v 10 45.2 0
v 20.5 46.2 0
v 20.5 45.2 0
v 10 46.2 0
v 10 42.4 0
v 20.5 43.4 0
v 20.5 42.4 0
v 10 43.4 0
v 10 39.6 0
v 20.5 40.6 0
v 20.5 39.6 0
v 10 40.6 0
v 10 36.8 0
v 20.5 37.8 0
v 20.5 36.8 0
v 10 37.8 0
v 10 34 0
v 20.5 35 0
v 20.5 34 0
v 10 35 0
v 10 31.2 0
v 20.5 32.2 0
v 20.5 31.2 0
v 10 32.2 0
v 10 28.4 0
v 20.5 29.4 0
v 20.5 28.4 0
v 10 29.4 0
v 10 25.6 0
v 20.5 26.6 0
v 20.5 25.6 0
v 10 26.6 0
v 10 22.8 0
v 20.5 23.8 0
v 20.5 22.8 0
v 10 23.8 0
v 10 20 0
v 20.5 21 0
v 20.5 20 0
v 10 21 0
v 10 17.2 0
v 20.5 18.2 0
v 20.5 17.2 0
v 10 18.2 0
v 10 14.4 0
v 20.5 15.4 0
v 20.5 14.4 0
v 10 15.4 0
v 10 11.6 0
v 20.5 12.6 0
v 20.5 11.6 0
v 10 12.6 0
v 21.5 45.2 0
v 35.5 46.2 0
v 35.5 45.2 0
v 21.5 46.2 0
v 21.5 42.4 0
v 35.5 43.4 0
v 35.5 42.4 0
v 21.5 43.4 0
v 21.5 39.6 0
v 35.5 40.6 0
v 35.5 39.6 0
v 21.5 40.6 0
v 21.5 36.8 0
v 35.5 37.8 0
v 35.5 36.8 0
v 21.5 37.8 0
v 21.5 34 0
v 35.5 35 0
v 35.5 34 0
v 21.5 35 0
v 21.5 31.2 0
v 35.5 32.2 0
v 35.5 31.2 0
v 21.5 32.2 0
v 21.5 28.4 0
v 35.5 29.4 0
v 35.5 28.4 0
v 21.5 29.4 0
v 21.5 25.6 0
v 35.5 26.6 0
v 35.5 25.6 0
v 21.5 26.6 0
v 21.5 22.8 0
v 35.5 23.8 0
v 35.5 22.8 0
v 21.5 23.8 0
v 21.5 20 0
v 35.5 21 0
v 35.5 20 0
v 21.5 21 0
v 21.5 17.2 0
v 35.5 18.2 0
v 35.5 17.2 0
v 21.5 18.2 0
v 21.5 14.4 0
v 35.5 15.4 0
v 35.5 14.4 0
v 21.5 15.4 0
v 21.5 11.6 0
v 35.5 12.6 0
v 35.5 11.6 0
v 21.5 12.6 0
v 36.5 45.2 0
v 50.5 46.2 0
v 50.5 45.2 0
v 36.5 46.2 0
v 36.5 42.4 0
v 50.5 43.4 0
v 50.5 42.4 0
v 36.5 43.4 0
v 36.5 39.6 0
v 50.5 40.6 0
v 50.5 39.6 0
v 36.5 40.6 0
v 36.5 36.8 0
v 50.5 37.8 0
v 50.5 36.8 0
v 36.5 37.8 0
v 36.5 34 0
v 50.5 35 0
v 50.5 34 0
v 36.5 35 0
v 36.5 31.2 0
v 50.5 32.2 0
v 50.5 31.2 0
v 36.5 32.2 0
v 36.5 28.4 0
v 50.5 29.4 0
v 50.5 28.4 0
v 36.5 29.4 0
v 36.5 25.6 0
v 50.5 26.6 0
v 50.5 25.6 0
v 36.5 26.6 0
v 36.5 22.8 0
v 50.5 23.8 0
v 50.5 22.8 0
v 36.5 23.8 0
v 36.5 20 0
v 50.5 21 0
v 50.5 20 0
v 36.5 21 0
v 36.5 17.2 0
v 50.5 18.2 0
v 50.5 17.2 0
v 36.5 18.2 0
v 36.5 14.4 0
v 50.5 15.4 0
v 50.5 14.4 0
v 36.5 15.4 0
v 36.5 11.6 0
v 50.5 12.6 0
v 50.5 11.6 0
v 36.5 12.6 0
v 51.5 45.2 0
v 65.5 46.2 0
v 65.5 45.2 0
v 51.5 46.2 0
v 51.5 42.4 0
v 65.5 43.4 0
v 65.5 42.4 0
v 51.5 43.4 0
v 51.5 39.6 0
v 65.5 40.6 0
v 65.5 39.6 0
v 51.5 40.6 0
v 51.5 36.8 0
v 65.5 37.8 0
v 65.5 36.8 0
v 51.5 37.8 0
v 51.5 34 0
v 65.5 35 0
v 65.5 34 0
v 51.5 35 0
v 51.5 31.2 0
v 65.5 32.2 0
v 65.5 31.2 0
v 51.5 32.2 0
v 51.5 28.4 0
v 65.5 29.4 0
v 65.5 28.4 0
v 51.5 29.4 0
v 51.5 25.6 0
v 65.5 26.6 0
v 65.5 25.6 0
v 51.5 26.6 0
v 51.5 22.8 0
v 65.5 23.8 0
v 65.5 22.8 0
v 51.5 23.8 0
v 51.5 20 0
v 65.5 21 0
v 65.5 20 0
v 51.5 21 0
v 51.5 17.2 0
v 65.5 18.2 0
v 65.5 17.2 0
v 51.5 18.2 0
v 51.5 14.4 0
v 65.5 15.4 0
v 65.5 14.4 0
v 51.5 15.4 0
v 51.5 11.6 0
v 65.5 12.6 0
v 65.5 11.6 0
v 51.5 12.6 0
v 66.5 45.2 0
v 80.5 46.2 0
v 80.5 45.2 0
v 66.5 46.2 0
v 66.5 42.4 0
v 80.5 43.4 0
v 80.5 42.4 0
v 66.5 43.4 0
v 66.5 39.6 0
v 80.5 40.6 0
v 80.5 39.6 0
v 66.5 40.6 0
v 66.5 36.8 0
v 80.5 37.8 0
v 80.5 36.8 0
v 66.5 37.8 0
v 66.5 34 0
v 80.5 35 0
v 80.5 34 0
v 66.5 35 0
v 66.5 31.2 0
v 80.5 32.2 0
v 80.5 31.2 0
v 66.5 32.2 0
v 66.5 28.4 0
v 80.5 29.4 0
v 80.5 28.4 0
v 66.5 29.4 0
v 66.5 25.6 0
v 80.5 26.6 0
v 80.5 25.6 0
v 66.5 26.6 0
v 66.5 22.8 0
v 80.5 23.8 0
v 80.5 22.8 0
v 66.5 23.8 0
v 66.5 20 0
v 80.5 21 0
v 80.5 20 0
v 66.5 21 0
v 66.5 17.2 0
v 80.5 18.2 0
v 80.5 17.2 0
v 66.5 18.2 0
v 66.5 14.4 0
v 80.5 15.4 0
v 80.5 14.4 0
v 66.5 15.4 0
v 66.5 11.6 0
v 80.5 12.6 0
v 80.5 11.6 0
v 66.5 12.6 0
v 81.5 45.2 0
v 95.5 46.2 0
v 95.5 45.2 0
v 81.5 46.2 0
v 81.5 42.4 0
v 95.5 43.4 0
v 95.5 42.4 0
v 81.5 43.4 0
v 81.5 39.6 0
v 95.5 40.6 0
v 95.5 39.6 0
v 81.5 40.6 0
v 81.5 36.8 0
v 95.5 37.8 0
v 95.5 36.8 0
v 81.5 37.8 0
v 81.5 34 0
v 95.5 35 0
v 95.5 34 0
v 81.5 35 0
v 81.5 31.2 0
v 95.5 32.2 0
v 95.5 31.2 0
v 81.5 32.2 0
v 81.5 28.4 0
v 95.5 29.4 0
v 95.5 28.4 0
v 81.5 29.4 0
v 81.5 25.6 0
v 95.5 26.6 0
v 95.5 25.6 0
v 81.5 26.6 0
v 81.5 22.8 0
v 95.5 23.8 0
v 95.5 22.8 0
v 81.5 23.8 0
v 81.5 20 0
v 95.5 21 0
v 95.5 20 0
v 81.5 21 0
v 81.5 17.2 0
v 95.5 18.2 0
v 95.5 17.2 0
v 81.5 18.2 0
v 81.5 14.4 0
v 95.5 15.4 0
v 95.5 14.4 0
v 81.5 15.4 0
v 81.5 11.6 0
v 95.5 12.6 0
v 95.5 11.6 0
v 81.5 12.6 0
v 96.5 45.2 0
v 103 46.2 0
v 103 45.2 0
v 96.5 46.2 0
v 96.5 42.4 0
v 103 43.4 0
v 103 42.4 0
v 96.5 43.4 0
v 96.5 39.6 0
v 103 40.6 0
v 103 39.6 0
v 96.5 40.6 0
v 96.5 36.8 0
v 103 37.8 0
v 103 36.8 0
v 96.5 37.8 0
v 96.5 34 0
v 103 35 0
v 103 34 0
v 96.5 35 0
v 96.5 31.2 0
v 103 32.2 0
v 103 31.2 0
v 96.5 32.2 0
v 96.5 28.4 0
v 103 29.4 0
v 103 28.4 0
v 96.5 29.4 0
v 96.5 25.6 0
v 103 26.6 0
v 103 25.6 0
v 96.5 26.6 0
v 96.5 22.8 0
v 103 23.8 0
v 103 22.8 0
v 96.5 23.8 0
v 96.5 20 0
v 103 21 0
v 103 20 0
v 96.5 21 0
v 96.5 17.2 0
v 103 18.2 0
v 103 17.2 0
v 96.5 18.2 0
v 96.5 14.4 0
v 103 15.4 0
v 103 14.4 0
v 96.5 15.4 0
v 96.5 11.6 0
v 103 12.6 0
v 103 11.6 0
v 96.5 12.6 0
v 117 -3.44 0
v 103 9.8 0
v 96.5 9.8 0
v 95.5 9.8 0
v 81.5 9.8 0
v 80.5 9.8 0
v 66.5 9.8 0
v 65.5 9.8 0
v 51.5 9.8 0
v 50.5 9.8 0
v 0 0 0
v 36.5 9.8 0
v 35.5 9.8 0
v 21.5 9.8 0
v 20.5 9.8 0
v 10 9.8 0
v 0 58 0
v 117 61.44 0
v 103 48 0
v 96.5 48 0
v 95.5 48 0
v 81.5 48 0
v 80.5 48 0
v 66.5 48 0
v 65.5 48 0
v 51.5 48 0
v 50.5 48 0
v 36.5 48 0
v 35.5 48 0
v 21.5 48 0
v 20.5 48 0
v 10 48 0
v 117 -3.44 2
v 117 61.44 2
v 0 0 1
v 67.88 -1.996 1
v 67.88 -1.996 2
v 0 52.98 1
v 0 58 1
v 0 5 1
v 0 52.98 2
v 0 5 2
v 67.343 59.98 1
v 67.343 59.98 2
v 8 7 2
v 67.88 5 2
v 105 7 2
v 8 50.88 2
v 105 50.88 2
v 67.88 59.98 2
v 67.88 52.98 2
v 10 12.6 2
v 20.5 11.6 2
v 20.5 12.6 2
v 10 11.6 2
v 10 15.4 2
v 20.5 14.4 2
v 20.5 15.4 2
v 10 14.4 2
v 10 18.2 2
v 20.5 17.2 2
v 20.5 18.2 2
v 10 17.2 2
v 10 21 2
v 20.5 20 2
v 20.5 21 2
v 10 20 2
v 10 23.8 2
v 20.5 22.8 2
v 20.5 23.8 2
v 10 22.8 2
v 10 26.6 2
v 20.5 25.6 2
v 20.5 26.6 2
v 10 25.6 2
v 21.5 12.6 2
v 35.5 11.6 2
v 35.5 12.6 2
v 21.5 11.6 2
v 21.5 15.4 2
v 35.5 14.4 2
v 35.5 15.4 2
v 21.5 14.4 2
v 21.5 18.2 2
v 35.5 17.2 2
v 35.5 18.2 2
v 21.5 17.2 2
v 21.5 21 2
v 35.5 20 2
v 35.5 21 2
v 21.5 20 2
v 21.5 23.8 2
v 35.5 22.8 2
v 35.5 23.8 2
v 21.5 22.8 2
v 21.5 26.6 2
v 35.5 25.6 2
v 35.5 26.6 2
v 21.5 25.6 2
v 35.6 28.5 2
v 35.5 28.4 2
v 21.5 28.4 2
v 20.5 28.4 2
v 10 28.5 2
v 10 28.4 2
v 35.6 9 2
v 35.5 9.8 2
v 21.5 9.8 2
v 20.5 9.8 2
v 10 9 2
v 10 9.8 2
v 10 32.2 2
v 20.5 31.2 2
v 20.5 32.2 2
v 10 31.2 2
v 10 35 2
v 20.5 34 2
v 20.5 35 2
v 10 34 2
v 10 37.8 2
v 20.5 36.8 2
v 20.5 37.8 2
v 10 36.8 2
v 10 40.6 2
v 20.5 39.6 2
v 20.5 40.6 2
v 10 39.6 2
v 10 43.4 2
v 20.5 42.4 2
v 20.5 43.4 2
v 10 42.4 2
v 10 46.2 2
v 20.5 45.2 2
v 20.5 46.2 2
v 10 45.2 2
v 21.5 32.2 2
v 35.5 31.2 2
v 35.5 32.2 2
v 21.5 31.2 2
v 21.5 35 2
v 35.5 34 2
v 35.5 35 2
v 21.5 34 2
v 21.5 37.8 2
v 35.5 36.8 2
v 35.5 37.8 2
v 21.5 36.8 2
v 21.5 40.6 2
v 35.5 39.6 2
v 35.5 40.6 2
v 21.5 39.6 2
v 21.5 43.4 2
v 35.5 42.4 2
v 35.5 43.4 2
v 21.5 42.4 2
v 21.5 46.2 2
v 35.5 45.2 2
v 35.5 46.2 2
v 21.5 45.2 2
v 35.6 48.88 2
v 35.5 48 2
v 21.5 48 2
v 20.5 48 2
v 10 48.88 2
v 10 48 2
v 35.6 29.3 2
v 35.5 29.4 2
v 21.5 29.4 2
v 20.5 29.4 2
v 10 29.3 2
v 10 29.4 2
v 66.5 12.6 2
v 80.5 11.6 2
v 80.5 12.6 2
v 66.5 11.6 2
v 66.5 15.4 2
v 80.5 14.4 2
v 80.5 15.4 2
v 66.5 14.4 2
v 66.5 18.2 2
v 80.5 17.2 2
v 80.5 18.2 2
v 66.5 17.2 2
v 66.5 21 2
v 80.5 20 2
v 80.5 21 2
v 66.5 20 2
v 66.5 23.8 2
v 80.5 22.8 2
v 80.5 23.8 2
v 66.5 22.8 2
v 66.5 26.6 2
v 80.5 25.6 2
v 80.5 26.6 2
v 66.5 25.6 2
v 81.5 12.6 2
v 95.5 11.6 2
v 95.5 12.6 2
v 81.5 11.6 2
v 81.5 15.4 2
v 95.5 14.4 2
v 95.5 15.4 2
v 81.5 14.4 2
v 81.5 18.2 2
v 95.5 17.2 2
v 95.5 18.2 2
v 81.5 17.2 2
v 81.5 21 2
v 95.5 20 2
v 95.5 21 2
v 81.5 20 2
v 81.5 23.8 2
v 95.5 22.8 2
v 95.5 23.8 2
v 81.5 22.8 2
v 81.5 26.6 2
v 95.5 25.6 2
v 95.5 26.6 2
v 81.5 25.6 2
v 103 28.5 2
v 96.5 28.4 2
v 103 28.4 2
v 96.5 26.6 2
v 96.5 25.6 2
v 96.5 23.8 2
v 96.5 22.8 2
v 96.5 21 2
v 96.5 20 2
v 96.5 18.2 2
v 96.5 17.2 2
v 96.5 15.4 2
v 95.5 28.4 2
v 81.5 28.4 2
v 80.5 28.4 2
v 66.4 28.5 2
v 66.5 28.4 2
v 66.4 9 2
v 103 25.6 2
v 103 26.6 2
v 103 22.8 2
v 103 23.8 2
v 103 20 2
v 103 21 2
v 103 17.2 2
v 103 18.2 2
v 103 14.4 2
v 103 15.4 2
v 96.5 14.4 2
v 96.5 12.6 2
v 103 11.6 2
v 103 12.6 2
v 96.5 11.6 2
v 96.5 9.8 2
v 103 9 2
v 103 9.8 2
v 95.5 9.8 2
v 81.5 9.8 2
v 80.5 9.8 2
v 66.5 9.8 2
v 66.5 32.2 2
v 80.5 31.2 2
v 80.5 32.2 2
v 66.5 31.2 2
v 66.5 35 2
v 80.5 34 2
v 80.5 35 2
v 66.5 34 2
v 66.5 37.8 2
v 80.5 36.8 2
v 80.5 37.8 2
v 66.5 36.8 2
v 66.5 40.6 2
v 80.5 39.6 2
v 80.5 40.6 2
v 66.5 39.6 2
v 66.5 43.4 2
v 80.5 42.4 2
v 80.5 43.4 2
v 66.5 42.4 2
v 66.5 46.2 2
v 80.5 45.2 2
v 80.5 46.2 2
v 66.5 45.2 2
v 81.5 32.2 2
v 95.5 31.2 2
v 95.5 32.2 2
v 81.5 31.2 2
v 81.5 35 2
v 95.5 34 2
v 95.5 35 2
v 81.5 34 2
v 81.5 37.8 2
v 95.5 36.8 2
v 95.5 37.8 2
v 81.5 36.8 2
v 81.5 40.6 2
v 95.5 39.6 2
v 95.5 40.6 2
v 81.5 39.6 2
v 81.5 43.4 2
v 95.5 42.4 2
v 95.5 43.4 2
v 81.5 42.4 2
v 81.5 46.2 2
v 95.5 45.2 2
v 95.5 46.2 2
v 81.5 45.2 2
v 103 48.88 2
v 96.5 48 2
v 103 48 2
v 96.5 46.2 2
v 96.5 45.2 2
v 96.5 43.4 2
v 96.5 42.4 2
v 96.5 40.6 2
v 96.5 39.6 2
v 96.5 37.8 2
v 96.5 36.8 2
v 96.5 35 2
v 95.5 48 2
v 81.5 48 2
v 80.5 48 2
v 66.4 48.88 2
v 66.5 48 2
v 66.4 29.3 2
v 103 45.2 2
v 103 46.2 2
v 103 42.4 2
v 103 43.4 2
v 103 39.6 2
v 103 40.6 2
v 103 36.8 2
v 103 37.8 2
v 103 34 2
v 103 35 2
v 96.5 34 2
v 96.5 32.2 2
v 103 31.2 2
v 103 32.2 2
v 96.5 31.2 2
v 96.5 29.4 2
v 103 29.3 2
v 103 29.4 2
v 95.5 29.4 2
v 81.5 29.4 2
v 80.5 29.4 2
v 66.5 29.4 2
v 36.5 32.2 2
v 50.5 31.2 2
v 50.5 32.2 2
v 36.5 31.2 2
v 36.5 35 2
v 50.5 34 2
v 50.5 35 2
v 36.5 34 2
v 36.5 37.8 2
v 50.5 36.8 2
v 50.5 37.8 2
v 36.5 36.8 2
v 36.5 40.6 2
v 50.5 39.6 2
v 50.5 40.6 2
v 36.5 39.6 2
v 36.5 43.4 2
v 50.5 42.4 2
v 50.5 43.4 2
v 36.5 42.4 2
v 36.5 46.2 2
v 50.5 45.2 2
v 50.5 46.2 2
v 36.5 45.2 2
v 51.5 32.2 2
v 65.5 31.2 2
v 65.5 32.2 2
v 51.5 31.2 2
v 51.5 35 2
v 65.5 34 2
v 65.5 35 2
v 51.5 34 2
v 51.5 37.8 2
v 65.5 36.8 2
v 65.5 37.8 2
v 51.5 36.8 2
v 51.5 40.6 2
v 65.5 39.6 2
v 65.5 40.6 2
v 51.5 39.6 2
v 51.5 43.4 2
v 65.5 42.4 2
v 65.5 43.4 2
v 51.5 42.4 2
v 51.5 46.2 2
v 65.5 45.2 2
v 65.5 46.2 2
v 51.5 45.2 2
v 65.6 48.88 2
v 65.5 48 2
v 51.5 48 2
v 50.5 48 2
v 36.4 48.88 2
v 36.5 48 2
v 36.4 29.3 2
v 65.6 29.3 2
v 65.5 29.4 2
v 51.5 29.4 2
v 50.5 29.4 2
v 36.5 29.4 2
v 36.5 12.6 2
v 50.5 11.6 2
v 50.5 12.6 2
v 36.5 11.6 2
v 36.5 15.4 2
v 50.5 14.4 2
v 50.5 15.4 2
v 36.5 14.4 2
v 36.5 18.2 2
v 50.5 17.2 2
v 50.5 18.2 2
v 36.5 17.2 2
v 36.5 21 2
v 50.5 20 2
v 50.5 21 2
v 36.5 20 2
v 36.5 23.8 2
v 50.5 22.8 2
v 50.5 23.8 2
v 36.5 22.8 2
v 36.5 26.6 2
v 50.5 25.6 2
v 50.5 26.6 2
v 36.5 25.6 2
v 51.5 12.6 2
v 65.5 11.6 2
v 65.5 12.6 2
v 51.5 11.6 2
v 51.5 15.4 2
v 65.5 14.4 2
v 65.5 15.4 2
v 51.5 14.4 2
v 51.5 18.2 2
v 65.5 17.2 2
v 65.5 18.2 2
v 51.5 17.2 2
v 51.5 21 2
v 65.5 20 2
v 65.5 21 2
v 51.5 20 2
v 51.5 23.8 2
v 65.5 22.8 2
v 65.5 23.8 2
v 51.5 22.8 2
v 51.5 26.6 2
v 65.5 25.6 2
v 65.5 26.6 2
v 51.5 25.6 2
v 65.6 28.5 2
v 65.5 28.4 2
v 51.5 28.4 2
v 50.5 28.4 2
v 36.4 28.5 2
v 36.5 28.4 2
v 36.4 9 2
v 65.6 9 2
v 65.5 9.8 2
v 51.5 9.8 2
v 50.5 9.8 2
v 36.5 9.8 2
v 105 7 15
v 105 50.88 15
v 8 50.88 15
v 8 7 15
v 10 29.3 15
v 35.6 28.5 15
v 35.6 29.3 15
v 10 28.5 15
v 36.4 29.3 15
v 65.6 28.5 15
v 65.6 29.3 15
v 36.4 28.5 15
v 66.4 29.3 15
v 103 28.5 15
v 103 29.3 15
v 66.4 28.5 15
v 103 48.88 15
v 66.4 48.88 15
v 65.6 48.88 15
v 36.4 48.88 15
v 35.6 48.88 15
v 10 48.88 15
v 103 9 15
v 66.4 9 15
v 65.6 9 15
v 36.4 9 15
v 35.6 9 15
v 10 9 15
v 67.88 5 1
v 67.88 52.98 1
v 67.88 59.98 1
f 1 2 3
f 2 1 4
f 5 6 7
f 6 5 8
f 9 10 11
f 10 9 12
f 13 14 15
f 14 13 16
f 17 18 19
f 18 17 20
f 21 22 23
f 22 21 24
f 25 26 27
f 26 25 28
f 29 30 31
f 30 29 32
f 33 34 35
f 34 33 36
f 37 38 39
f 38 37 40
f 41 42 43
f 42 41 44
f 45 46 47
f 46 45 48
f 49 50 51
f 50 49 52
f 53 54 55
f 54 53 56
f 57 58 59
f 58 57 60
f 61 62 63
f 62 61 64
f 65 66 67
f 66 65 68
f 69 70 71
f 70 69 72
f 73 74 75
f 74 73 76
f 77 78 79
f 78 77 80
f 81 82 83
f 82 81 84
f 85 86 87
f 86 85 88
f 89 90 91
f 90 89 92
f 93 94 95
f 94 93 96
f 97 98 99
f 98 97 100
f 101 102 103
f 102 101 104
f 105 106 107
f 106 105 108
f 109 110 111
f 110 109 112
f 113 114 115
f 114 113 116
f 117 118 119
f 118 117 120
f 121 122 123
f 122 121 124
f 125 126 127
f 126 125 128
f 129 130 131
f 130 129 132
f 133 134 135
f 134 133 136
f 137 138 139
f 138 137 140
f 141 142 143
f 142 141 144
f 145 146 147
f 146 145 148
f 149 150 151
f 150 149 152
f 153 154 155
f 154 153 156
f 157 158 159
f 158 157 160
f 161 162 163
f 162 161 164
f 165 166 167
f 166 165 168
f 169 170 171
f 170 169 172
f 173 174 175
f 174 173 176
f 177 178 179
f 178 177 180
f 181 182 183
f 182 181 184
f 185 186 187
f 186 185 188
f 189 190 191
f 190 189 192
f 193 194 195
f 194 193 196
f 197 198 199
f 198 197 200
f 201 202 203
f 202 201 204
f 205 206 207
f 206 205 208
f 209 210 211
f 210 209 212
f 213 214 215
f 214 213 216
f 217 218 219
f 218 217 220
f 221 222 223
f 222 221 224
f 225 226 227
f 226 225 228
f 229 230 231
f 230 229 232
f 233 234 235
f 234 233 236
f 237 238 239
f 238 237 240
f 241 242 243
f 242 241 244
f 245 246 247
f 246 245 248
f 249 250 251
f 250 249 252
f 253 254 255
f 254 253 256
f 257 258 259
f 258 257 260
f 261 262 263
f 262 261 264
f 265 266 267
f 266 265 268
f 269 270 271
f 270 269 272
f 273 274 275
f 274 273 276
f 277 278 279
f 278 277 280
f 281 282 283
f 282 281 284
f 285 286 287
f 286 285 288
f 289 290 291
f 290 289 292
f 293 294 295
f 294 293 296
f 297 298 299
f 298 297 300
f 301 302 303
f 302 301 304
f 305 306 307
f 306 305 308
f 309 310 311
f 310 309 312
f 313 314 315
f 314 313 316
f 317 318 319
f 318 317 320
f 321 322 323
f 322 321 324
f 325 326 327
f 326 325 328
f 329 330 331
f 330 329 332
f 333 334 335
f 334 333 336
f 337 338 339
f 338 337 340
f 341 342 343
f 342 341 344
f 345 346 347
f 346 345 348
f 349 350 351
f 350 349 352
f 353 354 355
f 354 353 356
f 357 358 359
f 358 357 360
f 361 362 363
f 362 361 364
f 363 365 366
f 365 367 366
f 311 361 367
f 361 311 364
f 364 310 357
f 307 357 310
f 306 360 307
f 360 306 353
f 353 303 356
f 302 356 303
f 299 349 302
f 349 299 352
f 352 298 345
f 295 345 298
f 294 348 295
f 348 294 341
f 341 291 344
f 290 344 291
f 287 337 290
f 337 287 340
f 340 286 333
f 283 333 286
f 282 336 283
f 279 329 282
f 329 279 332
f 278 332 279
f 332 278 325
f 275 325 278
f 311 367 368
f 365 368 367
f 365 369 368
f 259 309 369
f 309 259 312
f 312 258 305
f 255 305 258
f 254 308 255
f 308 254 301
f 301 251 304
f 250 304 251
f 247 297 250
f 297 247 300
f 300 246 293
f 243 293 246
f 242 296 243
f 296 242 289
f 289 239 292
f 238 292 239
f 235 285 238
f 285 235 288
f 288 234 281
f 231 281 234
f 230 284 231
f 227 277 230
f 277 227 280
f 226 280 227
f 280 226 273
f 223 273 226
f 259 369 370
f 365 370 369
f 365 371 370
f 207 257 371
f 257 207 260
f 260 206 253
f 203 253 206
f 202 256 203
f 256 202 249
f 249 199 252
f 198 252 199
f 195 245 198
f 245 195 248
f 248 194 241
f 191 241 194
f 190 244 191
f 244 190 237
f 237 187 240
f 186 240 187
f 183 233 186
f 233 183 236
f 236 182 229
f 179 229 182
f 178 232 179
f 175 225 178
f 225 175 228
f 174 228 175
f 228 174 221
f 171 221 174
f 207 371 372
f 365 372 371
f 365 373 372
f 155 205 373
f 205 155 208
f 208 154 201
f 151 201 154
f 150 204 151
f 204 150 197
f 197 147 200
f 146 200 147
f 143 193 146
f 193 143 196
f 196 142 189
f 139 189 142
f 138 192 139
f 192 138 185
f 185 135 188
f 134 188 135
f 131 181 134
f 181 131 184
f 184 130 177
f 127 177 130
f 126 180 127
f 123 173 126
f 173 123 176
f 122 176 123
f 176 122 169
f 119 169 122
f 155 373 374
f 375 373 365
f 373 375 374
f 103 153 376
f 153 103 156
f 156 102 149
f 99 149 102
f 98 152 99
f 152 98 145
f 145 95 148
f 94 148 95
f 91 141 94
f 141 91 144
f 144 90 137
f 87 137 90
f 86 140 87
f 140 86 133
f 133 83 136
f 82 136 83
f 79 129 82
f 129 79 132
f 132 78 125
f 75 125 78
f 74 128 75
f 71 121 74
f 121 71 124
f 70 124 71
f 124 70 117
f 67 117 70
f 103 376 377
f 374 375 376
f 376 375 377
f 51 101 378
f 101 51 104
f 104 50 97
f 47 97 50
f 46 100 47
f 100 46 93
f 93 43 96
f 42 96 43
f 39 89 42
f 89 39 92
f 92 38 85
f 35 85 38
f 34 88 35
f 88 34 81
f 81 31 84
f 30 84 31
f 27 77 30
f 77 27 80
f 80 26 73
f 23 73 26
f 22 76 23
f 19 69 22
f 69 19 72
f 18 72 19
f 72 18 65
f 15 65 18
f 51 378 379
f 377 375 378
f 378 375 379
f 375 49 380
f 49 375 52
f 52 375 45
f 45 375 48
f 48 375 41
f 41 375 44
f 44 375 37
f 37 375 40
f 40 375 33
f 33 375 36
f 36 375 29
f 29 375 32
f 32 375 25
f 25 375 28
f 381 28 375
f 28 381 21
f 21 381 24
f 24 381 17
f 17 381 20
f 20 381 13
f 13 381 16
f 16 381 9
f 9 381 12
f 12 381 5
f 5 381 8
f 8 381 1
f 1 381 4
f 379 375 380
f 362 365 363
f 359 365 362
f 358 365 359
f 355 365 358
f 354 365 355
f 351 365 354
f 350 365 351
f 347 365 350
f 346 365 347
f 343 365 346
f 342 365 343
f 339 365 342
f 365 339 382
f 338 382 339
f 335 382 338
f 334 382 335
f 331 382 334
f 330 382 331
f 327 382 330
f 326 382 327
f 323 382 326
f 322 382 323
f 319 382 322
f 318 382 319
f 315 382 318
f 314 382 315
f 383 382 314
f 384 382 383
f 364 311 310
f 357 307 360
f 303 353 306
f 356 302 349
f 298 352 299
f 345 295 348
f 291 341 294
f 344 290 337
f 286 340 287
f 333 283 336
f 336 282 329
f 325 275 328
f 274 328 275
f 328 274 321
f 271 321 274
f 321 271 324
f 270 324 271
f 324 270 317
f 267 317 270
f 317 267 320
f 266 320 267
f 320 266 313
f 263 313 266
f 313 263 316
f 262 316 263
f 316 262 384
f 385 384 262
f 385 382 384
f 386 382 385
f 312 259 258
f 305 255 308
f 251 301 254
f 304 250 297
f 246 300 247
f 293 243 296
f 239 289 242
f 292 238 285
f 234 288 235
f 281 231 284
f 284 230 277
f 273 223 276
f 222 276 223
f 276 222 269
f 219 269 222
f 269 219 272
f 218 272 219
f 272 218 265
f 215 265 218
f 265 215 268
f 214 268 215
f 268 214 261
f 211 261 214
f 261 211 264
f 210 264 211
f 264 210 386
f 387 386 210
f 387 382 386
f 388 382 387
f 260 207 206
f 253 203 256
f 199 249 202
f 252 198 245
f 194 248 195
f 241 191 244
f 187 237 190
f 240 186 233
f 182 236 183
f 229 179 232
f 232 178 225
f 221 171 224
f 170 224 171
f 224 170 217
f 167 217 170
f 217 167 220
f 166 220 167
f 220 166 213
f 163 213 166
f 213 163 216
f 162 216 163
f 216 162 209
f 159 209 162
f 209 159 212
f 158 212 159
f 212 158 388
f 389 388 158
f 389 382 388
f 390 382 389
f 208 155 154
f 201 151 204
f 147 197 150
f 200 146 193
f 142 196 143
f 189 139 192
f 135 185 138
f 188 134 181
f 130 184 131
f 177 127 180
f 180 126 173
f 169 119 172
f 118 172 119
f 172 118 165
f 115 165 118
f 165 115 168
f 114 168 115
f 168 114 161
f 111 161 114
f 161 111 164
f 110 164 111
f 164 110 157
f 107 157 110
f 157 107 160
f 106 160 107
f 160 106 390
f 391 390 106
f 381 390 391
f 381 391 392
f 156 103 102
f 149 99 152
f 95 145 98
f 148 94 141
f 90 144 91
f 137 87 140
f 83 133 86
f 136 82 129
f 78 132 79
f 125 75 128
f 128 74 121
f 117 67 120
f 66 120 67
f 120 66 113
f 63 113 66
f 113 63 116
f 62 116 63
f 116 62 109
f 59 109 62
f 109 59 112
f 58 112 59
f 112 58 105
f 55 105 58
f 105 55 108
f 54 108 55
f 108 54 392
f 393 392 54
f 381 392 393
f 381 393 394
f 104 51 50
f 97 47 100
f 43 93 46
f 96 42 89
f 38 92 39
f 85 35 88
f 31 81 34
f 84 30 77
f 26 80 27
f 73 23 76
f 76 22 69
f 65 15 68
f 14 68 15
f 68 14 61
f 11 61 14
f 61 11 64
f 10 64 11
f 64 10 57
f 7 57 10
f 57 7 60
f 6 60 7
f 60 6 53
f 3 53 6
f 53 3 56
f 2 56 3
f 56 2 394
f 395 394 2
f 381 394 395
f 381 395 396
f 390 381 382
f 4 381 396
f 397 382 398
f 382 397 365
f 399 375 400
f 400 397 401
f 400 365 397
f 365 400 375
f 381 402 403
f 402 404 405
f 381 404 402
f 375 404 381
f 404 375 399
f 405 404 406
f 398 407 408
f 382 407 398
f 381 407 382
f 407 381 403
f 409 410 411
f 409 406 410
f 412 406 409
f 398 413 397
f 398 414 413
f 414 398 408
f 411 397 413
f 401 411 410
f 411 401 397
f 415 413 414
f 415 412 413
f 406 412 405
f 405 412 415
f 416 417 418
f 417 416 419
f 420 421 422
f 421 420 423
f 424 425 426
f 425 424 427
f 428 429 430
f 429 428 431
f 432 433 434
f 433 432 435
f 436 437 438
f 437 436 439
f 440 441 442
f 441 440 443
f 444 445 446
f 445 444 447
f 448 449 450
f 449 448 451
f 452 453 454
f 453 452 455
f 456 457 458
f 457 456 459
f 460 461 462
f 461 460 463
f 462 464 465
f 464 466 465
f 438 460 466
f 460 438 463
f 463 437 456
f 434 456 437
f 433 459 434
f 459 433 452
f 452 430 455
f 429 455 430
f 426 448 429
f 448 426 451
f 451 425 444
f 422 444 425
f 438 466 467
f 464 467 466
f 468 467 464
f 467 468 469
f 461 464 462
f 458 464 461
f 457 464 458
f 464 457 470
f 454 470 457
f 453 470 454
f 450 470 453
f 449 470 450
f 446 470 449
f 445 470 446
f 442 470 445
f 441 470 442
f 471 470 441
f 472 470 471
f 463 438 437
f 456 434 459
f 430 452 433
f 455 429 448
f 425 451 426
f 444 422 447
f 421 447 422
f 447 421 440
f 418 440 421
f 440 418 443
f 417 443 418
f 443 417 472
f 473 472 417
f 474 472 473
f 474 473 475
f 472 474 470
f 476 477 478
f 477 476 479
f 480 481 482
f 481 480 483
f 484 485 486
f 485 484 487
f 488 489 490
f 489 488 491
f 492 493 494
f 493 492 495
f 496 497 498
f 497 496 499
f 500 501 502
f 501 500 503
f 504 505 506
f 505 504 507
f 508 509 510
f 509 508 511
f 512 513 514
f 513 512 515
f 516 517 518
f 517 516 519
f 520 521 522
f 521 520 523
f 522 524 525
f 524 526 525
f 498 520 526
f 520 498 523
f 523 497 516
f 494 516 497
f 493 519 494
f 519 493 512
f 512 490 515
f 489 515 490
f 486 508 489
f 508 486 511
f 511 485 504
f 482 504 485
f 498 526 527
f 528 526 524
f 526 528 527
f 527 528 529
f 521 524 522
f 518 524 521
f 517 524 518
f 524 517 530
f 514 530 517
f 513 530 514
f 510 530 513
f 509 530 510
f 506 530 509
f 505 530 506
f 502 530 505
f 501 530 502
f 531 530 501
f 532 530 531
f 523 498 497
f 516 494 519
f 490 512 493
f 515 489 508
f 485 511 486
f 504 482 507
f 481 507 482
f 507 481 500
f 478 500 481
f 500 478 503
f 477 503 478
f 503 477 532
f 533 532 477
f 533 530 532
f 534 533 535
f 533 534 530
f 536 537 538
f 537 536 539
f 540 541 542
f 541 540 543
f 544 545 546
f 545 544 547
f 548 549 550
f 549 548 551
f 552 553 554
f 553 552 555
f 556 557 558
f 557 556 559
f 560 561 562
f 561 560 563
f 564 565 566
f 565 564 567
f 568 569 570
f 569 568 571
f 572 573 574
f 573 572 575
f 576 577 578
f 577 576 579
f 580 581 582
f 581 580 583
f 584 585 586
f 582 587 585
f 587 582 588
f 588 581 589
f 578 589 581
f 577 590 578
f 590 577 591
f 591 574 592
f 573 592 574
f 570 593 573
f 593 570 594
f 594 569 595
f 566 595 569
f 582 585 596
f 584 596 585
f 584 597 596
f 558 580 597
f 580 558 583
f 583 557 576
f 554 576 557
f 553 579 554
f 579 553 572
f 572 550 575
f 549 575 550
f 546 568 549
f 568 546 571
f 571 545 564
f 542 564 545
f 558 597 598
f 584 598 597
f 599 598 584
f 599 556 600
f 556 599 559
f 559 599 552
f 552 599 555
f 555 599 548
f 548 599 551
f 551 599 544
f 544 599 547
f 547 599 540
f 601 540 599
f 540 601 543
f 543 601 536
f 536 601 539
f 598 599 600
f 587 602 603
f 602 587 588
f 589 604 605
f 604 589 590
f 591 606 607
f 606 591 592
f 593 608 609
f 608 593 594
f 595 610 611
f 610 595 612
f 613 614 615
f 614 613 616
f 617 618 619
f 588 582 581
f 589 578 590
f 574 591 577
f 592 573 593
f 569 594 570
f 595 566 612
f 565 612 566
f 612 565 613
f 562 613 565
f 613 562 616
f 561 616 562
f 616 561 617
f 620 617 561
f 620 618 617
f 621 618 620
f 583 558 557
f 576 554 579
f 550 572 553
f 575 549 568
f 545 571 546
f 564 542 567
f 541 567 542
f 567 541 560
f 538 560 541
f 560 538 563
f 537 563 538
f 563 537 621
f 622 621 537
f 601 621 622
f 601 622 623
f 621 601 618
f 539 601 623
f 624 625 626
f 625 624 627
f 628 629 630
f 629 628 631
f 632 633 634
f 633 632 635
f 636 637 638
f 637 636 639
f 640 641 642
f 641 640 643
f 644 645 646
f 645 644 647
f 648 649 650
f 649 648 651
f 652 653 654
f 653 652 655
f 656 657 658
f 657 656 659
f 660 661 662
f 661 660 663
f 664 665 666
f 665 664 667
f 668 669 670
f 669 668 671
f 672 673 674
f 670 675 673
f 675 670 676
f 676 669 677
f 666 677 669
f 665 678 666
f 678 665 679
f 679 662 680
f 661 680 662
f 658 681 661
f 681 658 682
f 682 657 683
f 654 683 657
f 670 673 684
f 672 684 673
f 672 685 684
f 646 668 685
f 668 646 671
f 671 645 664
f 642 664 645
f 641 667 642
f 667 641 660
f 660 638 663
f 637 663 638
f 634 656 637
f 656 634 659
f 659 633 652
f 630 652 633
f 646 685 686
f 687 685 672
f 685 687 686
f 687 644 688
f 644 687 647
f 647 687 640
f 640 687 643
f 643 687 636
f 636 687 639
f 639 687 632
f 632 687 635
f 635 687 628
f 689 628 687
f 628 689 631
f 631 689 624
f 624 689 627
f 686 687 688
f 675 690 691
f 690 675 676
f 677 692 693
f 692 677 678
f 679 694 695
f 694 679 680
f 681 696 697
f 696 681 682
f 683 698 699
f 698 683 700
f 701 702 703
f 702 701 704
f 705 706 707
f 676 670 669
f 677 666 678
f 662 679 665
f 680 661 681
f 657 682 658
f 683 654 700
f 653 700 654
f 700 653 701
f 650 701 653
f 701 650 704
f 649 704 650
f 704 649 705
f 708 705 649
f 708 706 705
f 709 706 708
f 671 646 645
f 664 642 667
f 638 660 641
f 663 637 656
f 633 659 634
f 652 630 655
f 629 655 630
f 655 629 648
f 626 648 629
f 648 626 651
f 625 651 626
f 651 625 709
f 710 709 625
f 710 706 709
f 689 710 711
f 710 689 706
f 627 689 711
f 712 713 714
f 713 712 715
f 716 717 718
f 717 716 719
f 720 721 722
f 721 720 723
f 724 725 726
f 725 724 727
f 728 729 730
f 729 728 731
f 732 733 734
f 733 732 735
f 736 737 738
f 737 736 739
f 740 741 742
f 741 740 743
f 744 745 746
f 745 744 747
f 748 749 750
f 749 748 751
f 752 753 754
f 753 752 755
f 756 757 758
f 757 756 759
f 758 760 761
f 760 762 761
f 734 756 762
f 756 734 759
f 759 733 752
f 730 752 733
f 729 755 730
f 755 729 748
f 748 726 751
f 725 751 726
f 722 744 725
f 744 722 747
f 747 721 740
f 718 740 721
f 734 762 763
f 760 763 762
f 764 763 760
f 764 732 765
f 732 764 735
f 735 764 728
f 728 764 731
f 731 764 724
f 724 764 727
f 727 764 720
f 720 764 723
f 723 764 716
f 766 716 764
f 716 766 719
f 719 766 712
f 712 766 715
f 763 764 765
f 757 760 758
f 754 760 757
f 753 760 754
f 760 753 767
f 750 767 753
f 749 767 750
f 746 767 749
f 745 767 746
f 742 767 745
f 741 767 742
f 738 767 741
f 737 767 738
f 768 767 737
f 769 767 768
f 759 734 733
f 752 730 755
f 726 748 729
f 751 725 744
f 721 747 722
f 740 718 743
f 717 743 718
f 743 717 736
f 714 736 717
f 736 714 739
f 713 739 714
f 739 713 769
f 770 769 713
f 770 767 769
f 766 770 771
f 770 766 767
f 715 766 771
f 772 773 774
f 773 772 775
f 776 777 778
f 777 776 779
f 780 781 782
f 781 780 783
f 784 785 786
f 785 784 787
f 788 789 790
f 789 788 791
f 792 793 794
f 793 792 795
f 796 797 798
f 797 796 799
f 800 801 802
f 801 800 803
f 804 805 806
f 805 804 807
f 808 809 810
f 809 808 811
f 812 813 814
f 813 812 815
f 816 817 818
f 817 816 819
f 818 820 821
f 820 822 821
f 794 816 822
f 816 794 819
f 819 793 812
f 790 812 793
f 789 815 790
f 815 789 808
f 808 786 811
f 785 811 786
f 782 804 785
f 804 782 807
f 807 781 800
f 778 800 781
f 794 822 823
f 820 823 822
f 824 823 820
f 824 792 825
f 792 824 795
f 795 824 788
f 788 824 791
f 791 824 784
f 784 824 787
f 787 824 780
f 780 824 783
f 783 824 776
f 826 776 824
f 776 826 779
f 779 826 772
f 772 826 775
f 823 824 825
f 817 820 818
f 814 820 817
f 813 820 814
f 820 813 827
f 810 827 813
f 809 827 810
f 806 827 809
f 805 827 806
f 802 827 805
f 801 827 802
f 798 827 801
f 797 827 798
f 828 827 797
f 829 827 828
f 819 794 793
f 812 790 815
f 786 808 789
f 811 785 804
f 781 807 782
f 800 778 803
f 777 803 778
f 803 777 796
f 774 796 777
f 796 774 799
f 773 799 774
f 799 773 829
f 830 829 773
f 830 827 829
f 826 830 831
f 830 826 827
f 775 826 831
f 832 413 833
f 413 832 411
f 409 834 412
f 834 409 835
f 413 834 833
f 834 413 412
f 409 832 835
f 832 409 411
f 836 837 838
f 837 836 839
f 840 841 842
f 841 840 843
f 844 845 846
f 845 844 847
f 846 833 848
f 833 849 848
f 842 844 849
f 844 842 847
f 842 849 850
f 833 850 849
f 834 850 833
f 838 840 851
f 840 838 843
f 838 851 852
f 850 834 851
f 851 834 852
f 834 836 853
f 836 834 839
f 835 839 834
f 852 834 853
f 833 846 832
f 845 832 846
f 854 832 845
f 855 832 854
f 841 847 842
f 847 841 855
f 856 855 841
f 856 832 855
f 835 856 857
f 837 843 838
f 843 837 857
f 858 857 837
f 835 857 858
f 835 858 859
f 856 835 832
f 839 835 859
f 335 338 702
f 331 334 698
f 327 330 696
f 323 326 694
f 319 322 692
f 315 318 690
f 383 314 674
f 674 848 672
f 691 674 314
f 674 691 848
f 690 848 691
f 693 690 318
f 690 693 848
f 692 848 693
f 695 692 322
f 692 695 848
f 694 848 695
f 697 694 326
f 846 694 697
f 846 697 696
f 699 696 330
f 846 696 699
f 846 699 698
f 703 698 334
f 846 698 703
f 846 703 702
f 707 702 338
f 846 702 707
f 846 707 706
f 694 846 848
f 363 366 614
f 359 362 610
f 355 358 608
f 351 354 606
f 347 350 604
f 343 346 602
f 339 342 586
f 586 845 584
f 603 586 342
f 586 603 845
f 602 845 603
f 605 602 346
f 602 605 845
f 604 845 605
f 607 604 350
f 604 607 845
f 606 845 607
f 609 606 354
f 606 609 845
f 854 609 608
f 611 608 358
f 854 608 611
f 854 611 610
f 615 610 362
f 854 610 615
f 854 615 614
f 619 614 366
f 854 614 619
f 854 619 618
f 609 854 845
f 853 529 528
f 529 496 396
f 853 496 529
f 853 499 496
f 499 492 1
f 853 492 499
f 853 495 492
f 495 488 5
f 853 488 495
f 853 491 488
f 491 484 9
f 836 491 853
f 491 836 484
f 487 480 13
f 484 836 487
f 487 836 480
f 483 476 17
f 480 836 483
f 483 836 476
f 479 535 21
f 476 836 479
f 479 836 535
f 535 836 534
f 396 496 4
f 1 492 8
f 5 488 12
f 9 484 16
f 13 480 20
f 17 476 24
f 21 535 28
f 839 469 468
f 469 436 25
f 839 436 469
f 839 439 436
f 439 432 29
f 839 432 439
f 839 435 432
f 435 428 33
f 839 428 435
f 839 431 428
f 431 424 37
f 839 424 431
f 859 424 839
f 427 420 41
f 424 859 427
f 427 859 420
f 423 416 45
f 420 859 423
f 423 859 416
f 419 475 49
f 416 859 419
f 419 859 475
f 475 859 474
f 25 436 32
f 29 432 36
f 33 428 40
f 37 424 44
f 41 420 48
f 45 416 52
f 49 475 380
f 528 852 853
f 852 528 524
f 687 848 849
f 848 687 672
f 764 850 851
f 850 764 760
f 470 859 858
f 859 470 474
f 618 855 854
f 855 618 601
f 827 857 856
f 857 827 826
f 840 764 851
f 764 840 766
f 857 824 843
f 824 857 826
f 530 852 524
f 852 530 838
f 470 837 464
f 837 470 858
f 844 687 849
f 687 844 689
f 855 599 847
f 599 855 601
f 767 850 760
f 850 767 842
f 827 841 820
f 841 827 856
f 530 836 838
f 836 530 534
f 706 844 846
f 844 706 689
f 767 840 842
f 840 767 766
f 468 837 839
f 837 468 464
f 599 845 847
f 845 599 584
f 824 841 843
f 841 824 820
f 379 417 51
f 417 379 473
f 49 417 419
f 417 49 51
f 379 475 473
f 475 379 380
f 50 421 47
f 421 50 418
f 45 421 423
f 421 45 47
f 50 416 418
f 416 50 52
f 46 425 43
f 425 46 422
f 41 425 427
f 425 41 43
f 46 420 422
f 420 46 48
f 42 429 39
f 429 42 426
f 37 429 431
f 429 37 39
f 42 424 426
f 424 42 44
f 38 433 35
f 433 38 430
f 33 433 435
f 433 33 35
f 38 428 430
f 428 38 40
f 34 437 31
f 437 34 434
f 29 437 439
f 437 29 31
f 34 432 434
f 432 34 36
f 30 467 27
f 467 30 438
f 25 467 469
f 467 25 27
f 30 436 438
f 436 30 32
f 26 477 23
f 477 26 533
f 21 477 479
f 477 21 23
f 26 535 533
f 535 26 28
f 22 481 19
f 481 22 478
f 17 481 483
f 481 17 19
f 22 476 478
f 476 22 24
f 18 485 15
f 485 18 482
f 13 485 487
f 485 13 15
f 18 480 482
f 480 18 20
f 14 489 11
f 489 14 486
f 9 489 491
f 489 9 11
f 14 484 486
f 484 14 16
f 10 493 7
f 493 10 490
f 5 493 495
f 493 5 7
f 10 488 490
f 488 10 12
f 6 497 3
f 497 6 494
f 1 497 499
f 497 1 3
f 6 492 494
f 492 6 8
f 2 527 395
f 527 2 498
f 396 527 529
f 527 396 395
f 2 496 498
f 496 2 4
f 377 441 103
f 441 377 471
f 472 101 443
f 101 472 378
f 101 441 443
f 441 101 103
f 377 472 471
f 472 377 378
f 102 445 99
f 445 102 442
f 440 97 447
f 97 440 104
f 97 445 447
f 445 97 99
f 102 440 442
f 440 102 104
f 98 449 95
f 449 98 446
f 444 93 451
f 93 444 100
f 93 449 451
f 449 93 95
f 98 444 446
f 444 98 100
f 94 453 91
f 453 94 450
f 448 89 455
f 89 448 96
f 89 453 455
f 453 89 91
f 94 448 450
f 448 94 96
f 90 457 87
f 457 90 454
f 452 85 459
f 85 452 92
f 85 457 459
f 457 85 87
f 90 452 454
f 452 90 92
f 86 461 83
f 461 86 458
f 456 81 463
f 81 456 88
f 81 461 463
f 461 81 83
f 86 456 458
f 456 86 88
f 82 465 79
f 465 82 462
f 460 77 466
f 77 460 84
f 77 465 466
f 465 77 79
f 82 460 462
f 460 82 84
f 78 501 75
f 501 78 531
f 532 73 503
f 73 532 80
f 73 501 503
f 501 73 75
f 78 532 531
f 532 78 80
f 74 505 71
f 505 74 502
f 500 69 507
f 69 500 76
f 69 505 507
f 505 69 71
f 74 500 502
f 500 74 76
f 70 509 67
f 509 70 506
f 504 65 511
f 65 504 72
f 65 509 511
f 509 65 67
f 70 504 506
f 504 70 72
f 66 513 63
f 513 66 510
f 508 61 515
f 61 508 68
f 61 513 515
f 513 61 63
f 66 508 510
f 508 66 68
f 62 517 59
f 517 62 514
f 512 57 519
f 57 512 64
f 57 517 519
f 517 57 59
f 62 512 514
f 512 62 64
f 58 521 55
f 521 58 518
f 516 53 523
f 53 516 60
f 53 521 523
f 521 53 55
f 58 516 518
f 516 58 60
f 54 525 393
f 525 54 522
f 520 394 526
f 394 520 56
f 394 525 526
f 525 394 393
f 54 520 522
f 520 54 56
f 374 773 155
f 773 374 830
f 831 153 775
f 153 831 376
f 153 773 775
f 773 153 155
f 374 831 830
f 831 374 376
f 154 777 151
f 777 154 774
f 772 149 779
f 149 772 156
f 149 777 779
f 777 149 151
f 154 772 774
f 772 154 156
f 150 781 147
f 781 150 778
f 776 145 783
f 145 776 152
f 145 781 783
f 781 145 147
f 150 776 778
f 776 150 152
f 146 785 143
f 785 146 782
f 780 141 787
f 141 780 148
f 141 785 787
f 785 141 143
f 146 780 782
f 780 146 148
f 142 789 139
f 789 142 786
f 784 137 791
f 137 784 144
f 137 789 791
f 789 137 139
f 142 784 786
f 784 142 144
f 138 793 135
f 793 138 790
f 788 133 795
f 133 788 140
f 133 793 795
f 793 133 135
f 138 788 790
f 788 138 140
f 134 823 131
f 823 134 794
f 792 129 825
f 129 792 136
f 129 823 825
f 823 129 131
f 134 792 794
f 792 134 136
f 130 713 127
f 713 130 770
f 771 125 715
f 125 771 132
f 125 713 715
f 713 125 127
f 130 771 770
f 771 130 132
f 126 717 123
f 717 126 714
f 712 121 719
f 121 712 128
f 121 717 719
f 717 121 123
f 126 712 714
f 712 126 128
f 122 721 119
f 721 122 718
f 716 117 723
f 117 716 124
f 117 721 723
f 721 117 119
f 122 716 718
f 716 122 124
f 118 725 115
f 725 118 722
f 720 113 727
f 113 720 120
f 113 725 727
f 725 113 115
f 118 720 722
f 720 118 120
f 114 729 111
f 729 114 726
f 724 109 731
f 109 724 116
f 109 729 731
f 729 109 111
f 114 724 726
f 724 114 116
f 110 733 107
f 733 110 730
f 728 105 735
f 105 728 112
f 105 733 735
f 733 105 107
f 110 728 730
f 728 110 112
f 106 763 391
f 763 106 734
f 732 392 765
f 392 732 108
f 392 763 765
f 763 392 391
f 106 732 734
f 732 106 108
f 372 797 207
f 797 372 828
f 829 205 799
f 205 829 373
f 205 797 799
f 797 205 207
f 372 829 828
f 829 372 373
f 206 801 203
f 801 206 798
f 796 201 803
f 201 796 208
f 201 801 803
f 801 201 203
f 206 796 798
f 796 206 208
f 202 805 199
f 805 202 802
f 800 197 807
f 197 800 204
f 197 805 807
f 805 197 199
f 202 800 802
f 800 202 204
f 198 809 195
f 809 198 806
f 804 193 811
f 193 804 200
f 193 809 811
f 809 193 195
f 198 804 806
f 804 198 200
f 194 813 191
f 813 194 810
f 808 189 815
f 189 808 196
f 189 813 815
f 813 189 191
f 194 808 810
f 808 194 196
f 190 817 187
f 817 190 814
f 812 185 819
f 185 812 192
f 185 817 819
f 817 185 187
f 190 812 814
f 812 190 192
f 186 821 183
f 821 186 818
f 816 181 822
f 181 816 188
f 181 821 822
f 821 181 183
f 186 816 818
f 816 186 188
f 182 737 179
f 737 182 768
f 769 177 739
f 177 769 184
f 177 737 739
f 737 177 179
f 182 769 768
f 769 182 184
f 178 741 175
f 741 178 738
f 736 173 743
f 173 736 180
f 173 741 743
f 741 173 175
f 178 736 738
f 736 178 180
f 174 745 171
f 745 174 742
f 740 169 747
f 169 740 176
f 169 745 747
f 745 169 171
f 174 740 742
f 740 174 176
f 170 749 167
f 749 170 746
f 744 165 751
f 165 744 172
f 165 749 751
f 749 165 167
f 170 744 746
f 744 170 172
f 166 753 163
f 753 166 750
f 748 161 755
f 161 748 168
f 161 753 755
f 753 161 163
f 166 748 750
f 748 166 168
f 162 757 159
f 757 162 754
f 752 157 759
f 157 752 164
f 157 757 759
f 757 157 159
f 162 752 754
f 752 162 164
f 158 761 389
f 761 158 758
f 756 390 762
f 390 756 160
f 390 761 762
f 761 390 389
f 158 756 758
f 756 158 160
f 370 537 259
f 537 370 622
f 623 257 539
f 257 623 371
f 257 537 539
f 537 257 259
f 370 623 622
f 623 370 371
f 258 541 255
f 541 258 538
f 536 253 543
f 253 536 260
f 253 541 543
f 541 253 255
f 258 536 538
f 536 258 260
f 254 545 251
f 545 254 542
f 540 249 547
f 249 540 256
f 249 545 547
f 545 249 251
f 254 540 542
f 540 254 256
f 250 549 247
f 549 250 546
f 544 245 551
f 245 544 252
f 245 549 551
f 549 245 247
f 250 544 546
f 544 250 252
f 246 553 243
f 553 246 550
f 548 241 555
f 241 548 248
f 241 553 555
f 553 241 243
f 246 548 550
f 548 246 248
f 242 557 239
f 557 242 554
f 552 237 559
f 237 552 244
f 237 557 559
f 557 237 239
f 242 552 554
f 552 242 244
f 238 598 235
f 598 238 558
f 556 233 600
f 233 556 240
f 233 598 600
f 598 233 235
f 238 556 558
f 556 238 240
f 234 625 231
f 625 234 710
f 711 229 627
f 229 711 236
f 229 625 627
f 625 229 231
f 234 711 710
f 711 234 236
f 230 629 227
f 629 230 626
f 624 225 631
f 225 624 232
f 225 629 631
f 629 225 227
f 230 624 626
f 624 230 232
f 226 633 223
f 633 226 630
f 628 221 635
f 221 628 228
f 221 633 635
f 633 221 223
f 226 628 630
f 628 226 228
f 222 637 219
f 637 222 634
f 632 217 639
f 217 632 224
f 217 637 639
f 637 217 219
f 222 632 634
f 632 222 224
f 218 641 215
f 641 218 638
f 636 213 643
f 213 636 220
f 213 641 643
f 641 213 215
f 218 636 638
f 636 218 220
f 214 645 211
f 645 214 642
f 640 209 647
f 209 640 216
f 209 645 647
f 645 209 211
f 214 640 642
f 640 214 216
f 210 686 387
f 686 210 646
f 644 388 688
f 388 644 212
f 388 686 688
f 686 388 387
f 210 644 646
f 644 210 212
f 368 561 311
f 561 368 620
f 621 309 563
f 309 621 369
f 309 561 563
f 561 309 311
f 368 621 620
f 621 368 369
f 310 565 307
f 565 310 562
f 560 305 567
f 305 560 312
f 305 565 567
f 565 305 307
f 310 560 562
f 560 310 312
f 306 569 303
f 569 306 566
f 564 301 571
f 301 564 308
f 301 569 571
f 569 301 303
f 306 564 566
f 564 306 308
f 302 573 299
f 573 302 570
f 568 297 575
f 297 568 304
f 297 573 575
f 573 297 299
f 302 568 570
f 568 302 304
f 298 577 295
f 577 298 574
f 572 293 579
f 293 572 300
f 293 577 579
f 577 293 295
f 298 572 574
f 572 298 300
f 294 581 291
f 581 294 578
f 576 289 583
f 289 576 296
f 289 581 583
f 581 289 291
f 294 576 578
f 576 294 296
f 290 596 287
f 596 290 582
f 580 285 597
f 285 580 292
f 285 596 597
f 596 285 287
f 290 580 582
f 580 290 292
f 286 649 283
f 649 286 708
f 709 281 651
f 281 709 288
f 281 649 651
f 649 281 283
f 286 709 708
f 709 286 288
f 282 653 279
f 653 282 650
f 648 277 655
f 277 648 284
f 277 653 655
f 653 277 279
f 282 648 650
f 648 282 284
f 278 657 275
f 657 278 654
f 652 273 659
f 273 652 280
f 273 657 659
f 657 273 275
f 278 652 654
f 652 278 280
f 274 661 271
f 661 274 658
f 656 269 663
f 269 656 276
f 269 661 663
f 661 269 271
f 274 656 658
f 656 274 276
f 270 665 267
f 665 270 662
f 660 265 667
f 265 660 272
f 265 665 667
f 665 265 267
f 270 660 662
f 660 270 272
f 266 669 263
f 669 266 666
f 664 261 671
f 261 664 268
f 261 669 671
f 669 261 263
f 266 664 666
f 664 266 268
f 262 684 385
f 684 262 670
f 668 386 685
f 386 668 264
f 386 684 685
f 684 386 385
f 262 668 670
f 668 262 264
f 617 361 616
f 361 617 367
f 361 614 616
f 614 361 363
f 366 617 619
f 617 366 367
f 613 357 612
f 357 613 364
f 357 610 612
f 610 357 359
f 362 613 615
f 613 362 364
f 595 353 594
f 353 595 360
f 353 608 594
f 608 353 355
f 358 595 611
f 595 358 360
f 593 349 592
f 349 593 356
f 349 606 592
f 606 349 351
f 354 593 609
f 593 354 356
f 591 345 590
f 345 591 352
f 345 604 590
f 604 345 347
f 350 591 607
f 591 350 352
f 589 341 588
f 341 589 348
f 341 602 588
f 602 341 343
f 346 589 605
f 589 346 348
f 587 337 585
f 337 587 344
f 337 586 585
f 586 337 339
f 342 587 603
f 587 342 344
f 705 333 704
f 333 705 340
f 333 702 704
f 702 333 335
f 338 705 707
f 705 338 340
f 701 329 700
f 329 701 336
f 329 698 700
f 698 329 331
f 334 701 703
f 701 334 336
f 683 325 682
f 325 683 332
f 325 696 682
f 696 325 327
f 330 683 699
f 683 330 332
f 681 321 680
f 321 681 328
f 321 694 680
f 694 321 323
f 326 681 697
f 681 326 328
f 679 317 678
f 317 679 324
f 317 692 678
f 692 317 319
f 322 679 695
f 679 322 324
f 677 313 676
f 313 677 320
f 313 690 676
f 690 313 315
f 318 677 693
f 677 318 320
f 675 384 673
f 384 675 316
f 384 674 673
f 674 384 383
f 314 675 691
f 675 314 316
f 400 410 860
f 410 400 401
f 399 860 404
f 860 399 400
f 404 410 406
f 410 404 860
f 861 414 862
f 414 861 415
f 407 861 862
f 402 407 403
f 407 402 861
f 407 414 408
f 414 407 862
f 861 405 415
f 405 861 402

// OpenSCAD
//labeled combo box for string
Opcao_Gerar="P"; // [P:Principal, T:Topo]

seleciona();

module seleciona() {
  if (Opcao_Gerar == "P") makePrincipal();
  if (Opcao_Gerar == "T") makeTopo();
}

//parametros
lMin = 58;
lMax = 64.88; //63
comp = 117;
altura = 2;
bordaL = 15;


// --------------------------------------------
module makePrincipal(addEncaixe = true) {
    difference() {
    union() {
        body();
        if (addEncaixe == true) addEncaixe();

        gridPattern();
    }

    bodyCorte();
    }
}

module makeTopo() {
    //color("black")
    //translate([0,0,2])
    bodyTopo();
}

module addEncaixe() {
iMax = lMax - bordaL - (4+2);
icomp = comp - bordaL - 5;

union() {
    difference() {

    color("red")
    translate([bordaL-(9-2),bordaL-(10-2),0])
    cube([icomp,iMax,15]);

    color("blue")
    translate([bordaL-(9-4),bordaL-(10-4),-2])
    cube([icomp - 4,iMax - 4,19]);

    }
    
//traves
translate([bordaL+25-4.4,bordaL-(10-2),0])
cube([0.8,iMax,15]);

translate([bordaL+60-9.4,bordaL-(10-2),0])
cube([0.8,iMax,15]);

translate([bordaL-7,(lMin/2)-0.5,0])
cube([icomp,0.8,15]);
}
    
}


module bodyTopo() {
iMax = lMax - bordaL - (4+2) + 2.4;
icomp = comp - bordaL - 5 + 2.4;

difference() {

color("red")
translate([bordaL-13,bordaL-13,0])
cube([icomp+10,iMax+8,3]);

color("blue")
translate([bordaL-7.2,bordaL-8.2,-2])
cube([icomp-2,iMax-2,6]);

}
    
}

module bodyCorte() {
    brd = 5;
    dDif = 2;
    eDif = 11.9;
    
    translate([0,0,-1])
    rotate([0,-0,0]) {
        translate([-2,-dDif,2])
        cube([lMax+5,brd+dDif,altura*2]);

        translate([-2,lMax-eDif,2])
        cube([lMax+5,brd+dDif,altura*2]);
    }
}

module body() {
    difference() {
        bodyExterno();
        bodyInterno();
    }
}

module bodyExterno() {
    linear_extrude(height=altura, center=false, convexity=10)
    polygon_body();
}

module bodyInterno() {
    iMax = lMax - bordaL - (4+2);
    icomp = comp - bordaL - 5;

    translate([bordaL-(9-2),bordaL-(10-2),-1])
    cube([icomp,iMax,altura*2]);
}

module polygon_body(diferenca = 0) {
    diferenca = diferenca * 2;
    lMin = (lMin - diferenca);
    lMax = (lMax - diferenca);
    comp = 117 - (diferenca * 1.2);
    lDif = (lMax - lMin) / 2;

    polygon([[0,0],[comp,-lDif],[comp,lMin+lDif],[0,lMin]]);
}



module gridPattern() {

translate([6.5,5])
difference() {
    color("green")
    cube([103,47.5,2]);

    
    union() {
    translate([0,-0.8,-1])
    color("gray")
    {for (a =[0:6]) {
        for (b =[0:17]) {
            aa = a + (a * 14);
            ba = b + (b * 1.8);
            translate([aa,ba,0])
            cube([14,1.8,4]);
        }
    }}}
}
}
